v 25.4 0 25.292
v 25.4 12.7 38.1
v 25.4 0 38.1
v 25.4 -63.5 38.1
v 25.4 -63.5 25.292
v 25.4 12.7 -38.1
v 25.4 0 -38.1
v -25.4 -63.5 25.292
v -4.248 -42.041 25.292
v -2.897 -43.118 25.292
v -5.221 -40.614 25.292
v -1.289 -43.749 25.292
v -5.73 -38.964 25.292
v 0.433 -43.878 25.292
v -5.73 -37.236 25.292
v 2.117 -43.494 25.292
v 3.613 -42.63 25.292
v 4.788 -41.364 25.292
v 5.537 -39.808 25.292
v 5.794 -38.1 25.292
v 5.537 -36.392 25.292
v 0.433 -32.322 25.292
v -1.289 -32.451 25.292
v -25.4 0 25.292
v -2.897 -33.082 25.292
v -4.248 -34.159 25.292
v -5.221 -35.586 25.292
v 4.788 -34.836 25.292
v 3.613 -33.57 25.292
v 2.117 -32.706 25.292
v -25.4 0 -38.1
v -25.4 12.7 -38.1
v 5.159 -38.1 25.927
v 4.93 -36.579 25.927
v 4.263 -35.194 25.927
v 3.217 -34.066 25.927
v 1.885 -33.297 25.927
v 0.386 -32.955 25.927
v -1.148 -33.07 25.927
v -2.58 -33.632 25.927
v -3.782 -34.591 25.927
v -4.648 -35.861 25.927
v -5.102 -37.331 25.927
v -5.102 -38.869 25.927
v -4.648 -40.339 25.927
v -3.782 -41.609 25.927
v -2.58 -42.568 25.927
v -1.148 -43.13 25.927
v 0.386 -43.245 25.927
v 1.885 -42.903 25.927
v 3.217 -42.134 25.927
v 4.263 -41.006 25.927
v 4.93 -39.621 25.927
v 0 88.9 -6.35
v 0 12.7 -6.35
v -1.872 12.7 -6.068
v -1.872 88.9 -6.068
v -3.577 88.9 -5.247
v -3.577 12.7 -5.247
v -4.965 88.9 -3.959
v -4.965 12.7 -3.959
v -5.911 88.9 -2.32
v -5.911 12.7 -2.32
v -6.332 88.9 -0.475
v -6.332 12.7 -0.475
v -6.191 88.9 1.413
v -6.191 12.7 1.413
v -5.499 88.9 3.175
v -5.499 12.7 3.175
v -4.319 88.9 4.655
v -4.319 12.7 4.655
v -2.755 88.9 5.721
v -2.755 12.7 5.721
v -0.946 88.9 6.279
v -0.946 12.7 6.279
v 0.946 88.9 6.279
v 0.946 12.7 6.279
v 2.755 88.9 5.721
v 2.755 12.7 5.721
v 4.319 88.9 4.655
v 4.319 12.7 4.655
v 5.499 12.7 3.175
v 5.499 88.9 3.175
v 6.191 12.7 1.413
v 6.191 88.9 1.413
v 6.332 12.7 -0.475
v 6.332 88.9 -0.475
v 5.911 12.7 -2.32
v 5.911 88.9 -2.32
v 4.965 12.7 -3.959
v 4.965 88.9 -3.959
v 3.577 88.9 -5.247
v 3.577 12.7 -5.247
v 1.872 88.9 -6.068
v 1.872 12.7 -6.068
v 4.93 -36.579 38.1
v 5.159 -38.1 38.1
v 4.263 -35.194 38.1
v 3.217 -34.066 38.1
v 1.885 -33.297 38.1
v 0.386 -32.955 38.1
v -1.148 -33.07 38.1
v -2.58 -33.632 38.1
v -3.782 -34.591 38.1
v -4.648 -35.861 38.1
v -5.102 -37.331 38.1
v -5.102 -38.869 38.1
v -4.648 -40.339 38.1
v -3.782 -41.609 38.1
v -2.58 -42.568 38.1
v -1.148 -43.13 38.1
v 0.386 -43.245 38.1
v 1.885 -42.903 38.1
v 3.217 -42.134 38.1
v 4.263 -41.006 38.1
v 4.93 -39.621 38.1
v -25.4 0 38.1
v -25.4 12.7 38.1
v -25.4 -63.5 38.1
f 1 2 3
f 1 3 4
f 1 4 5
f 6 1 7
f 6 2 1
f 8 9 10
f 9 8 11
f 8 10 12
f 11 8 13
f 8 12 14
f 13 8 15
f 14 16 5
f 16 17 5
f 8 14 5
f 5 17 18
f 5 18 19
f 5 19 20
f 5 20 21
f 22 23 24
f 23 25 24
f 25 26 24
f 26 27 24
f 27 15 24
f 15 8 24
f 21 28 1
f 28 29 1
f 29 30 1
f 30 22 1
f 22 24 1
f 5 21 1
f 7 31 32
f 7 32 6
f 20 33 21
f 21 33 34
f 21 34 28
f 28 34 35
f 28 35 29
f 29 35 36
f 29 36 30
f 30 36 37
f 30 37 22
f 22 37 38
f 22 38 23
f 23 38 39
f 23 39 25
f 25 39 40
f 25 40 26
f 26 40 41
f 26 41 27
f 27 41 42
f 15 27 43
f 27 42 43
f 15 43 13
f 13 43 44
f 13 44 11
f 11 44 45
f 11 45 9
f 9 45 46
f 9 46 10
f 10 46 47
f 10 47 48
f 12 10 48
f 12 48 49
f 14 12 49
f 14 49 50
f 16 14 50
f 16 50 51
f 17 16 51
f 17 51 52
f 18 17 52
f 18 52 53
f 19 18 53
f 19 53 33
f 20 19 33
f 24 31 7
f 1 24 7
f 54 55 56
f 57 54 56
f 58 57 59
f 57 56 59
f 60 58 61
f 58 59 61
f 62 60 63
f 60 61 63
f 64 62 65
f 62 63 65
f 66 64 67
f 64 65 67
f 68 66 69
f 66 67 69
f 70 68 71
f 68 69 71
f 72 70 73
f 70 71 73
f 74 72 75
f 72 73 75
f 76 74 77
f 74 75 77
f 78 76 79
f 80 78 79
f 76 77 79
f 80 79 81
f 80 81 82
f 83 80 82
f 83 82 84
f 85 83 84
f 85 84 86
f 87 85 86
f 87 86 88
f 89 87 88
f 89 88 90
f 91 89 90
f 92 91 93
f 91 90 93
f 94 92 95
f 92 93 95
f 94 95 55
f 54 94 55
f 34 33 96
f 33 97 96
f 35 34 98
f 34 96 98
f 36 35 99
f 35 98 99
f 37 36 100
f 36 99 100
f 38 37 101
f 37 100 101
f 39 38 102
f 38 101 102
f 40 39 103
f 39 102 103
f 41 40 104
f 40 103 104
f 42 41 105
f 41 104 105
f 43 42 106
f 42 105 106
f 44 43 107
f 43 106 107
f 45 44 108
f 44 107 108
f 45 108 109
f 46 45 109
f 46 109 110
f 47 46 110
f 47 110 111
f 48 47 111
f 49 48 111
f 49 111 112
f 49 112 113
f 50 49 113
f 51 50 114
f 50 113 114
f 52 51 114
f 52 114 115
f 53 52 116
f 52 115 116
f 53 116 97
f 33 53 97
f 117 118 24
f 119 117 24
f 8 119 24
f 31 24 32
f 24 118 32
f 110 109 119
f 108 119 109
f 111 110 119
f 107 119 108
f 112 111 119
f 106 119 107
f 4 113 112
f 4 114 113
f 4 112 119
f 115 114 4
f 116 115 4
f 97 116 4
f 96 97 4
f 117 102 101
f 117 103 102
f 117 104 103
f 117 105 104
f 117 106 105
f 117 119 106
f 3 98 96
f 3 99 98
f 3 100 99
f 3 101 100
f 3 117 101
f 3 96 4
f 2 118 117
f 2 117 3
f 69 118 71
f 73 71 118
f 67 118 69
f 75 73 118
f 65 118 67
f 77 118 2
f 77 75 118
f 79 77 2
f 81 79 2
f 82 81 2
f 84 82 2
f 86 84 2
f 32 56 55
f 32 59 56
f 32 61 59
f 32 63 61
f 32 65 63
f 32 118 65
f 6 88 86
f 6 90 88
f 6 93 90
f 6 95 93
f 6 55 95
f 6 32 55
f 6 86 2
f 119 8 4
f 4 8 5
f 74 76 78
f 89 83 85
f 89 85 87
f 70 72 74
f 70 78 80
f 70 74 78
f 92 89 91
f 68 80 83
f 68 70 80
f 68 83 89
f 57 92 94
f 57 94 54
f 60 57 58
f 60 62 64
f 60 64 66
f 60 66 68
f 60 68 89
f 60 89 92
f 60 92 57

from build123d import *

# Parameters (mm, degrees)
SKETCH1_W                                  = 50.8
SKETCH1_H                                  = 76.2
BOSS_EXTRUDE1_DEPTH                        = 12.7
SKETCH2_R                                  = 6.35
BOSS_EXTRUDE2_DEPTH                        = 76.2
SKETCH4_W                                  = 50.8
SKETCH4_H                                  = 12.808038323
BOSS_EXTRUDE3_DEPTH                        = 76.2
F_13_32_0_40625_DIAMETER_HOLE1_D           = 10.31875
F_13_32_0_40625_DIAMETER_HOLE1_CSINK_D     = 11.58875
F_13_32_0_40625_DIAMETER_HOLE1_CSINK_ANGLE = 90


with BuildPart() as part:
    # Sketch1 → Boss-Extrude1 (new body)
    with BuildSketch(Plane(origin=(0, 0, 0), x_dir=(1, 0, 0), z_dir=(0, 1, 0))):
        Rectangle(SKETCH1_W, SKETCH1_H)
    extrude(amount=BOSS_EXTRUDE1_DEPTH)

    # Sketch2 → Boss-Extrude2 (add)
    with BuildSketch(Plane(origin=(0, 12.7, 0), x_dir=(1, 0, 0), z_dir=(0, 1, 0))):
        with Locations(Location((0, 0, 0), (0, 0, 90))):
            Circle(SKETCH2_R)
    extrude(amount=BOSS_EXTRUDE2_DEPTH)

    # Sketch4 → Boss-Extrude3 (add)
    with BuildSketch(Plane(origin=(0, 12.7, 0), x_dir=(1, 0, 0), z_dir=(0, 1, 0))):
        with Locations((0, -31.695980839)):
            Rectangle(SKETCH4_W, SKETCH4_H)
    extrude(amount=-BOSS_EXTRUDE3_DEPTH)

    # 13/32 (0.40625) Diameter Hole1 (through all)
    with Locations(Plane(origin=(0, 0, 25.291961677), x_dir=(-1, 0, 0), z_dir=(0, 0, -1))):
        with Locations((0, -38.1)):
            CounterSinkHole(F_13_32_0_40625_DIAMETER_HOLE1_D / 2, F_13_32_0_40625_DIAMETER_HOLE1_CSINK_D / 2, counter_sink_angle=F_13_32_0_40625_DIAMETER_HOLE1_CSINK_ANGLE)


solid = part.part
